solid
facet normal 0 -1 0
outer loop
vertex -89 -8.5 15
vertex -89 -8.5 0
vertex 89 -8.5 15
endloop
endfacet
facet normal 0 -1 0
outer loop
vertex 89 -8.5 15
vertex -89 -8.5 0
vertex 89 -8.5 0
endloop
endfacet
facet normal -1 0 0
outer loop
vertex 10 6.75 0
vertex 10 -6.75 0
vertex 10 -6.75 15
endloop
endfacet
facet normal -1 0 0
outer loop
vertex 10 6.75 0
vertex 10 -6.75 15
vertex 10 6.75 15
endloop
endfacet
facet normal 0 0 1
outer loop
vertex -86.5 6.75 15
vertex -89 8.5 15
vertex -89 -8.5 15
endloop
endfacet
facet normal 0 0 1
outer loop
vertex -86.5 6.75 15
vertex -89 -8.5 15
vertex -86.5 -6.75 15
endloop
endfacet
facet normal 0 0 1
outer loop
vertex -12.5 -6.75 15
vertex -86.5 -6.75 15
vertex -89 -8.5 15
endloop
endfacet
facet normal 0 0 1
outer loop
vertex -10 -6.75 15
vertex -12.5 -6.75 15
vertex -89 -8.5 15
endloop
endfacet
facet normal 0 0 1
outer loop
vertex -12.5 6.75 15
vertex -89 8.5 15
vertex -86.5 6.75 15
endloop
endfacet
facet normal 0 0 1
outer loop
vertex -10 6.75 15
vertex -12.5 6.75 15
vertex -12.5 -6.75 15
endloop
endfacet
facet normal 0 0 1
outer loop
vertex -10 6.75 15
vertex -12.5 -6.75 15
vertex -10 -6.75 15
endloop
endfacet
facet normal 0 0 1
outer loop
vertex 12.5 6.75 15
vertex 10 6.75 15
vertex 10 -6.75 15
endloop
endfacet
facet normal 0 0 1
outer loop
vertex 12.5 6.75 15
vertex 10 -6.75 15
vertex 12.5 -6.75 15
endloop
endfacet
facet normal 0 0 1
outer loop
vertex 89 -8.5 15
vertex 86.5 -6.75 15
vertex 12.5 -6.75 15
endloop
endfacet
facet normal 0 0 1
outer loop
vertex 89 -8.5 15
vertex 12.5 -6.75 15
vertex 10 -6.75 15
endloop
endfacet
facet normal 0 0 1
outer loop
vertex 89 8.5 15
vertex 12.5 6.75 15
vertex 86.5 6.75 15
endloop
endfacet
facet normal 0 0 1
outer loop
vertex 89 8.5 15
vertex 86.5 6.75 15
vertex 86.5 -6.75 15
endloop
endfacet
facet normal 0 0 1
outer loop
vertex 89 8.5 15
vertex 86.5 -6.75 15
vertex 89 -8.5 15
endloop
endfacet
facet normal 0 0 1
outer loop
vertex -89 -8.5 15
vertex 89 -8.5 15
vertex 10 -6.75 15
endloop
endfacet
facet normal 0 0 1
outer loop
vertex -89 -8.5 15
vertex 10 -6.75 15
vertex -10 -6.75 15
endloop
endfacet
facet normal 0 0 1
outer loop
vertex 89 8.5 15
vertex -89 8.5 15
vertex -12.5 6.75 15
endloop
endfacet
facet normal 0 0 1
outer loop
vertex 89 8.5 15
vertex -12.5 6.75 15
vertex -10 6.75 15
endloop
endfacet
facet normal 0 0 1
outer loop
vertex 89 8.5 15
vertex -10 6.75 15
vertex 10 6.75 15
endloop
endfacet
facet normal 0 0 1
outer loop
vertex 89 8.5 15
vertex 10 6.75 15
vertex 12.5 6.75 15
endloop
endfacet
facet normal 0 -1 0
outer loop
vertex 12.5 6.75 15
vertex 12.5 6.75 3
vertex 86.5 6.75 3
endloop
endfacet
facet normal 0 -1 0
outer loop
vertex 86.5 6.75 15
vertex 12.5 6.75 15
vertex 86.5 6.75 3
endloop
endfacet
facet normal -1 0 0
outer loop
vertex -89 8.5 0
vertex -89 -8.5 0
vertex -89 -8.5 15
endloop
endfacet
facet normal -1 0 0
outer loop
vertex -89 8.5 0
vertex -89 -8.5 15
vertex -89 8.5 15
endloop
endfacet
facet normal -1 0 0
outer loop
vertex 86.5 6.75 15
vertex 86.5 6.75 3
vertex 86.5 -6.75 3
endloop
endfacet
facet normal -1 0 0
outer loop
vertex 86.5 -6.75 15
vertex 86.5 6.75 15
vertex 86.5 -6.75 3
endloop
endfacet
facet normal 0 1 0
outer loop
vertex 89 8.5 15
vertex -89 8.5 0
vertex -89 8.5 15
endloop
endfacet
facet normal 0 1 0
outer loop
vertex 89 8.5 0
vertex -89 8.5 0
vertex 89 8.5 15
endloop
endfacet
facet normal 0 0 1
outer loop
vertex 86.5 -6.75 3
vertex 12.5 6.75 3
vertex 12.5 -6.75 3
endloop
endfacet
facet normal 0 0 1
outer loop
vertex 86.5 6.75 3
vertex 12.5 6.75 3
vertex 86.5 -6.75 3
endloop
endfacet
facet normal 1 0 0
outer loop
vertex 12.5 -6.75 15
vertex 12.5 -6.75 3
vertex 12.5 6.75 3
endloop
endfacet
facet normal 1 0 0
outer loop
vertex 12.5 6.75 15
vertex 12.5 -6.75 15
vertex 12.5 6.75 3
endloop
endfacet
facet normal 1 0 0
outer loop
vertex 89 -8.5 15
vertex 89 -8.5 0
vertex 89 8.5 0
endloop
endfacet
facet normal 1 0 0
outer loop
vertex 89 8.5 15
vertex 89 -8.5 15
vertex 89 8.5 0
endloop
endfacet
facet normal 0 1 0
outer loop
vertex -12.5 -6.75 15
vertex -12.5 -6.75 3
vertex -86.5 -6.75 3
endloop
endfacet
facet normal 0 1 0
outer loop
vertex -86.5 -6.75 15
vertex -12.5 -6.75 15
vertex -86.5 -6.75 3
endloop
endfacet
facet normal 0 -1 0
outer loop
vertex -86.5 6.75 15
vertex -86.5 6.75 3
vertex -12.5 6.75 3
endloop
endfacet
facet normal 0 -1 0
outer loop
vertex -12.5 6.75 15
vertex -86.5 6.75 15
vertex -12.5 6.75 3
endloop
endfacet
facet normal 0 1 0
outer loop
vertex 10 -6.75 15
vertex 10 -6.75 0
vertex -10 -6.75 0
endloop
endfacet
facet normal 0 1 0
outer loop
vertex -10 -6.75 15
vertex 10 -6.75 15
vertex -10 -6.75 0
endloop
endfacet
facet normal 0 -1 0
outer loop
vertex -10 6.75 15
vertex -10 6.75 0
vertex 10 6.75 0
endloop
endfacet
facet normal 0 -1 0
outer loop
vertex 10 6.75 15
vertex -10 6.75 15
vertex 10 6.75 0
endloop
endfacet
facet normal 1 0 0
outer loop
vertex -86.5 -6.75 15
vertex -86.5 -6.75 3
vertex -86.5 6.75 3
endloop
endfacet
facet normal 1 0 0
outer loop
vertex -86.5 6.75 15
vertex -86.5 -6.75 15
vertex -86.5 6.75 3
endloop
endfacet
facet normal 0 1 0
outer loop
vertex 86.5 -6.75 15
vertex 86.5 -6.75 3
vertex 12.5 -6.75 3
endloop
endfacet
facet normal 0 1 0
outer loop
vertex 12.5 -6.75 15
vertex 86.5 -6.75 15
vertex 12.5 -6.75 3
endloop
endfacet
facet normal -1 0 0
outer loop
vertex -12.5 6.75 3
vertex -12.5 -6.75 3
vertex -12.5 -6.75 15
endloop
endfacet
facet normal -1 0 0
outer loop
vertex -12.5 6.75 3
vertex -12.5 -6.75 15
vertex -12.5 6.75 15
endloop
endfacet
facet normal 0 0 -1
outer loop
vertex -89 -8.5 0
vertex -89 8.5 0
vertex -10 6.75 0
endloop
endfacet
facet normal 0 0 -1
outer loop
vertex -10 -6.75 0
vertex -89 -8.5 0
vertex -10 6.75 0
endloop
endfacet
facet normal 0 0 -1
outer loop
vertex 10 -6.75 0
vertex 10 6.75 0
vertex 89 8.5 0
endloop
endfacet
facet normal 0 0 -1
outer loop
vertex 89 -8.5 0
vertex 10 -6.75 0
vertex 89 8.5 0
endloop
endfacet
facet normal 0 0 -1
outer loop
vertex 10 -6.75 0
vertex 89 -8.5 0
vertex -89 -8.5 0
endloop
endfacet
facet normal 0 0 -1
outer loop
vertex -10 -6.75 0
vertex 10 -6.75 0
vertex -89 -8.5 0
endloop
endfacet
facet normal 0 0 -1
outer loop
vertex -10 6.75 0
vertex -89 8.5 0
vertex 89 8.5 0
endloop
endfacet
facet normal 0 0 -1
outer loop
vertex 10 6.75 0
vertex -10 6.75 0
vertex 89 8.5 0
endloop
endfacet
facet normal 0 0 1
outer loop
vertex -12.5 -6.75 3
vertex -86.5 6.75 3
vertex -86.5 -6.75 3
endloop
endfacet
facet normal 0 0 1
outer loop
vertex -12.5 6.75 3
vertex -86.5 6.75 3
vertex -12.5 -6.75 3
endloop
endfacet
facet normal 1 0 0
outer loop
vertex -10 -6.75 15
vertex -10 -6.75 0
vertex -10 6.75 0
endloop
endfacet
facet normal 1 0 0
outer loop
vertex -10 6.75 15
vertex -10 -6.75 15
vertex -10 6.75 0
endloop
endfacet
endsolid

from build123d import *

# Parameters (mm, degrees)
F0_W     = 178
F0_H     = 17
F0_W_2   = 2.5
F0_H_2   = 13.5
F1_DEPTH = 15
F0_W_3   = 74
F2_DEPTH = 3


with BuildPart() as f1:
    # F0 (on Top) → F1 (new body)
    with BuildSketch(Plane.XY):
        Rectangle(F0_W, F0_H)
        Polygon((-10, -6.75), (-12.5, -6.75), (-86.5, -6.75), (-86.5, 6.75), (-12.5, 6.75), (-10, 6.75), (10, 6.75), (12.5, 6.75), (86.5, 6.75), (86.5, -6.75), (12.5, -6.75), (10, -6.75), align=None, mode=Mode.SUBTRACT)
        with Locations((-11.25, 0)):
            Rectangle(F0_W_2, F0_H_2)
        with Locations((11.25, 0)):
            Rectangle(F0_W_2, F0_H_2)
    extrude(amount=F1_DEPTH)

    # F0 (on Top) → F2 (join)
    with BuildSketch(Plane.XY):
        with Locations((-49.5, 0)):
            Rectangle(F0_W_3, F0_H_2)
        with Locations((49.5, 0)):
            Rectangle(F0_W_3, F0_H_2)
    extrude(amount=F2_DEPTH)


solid = f1.part
